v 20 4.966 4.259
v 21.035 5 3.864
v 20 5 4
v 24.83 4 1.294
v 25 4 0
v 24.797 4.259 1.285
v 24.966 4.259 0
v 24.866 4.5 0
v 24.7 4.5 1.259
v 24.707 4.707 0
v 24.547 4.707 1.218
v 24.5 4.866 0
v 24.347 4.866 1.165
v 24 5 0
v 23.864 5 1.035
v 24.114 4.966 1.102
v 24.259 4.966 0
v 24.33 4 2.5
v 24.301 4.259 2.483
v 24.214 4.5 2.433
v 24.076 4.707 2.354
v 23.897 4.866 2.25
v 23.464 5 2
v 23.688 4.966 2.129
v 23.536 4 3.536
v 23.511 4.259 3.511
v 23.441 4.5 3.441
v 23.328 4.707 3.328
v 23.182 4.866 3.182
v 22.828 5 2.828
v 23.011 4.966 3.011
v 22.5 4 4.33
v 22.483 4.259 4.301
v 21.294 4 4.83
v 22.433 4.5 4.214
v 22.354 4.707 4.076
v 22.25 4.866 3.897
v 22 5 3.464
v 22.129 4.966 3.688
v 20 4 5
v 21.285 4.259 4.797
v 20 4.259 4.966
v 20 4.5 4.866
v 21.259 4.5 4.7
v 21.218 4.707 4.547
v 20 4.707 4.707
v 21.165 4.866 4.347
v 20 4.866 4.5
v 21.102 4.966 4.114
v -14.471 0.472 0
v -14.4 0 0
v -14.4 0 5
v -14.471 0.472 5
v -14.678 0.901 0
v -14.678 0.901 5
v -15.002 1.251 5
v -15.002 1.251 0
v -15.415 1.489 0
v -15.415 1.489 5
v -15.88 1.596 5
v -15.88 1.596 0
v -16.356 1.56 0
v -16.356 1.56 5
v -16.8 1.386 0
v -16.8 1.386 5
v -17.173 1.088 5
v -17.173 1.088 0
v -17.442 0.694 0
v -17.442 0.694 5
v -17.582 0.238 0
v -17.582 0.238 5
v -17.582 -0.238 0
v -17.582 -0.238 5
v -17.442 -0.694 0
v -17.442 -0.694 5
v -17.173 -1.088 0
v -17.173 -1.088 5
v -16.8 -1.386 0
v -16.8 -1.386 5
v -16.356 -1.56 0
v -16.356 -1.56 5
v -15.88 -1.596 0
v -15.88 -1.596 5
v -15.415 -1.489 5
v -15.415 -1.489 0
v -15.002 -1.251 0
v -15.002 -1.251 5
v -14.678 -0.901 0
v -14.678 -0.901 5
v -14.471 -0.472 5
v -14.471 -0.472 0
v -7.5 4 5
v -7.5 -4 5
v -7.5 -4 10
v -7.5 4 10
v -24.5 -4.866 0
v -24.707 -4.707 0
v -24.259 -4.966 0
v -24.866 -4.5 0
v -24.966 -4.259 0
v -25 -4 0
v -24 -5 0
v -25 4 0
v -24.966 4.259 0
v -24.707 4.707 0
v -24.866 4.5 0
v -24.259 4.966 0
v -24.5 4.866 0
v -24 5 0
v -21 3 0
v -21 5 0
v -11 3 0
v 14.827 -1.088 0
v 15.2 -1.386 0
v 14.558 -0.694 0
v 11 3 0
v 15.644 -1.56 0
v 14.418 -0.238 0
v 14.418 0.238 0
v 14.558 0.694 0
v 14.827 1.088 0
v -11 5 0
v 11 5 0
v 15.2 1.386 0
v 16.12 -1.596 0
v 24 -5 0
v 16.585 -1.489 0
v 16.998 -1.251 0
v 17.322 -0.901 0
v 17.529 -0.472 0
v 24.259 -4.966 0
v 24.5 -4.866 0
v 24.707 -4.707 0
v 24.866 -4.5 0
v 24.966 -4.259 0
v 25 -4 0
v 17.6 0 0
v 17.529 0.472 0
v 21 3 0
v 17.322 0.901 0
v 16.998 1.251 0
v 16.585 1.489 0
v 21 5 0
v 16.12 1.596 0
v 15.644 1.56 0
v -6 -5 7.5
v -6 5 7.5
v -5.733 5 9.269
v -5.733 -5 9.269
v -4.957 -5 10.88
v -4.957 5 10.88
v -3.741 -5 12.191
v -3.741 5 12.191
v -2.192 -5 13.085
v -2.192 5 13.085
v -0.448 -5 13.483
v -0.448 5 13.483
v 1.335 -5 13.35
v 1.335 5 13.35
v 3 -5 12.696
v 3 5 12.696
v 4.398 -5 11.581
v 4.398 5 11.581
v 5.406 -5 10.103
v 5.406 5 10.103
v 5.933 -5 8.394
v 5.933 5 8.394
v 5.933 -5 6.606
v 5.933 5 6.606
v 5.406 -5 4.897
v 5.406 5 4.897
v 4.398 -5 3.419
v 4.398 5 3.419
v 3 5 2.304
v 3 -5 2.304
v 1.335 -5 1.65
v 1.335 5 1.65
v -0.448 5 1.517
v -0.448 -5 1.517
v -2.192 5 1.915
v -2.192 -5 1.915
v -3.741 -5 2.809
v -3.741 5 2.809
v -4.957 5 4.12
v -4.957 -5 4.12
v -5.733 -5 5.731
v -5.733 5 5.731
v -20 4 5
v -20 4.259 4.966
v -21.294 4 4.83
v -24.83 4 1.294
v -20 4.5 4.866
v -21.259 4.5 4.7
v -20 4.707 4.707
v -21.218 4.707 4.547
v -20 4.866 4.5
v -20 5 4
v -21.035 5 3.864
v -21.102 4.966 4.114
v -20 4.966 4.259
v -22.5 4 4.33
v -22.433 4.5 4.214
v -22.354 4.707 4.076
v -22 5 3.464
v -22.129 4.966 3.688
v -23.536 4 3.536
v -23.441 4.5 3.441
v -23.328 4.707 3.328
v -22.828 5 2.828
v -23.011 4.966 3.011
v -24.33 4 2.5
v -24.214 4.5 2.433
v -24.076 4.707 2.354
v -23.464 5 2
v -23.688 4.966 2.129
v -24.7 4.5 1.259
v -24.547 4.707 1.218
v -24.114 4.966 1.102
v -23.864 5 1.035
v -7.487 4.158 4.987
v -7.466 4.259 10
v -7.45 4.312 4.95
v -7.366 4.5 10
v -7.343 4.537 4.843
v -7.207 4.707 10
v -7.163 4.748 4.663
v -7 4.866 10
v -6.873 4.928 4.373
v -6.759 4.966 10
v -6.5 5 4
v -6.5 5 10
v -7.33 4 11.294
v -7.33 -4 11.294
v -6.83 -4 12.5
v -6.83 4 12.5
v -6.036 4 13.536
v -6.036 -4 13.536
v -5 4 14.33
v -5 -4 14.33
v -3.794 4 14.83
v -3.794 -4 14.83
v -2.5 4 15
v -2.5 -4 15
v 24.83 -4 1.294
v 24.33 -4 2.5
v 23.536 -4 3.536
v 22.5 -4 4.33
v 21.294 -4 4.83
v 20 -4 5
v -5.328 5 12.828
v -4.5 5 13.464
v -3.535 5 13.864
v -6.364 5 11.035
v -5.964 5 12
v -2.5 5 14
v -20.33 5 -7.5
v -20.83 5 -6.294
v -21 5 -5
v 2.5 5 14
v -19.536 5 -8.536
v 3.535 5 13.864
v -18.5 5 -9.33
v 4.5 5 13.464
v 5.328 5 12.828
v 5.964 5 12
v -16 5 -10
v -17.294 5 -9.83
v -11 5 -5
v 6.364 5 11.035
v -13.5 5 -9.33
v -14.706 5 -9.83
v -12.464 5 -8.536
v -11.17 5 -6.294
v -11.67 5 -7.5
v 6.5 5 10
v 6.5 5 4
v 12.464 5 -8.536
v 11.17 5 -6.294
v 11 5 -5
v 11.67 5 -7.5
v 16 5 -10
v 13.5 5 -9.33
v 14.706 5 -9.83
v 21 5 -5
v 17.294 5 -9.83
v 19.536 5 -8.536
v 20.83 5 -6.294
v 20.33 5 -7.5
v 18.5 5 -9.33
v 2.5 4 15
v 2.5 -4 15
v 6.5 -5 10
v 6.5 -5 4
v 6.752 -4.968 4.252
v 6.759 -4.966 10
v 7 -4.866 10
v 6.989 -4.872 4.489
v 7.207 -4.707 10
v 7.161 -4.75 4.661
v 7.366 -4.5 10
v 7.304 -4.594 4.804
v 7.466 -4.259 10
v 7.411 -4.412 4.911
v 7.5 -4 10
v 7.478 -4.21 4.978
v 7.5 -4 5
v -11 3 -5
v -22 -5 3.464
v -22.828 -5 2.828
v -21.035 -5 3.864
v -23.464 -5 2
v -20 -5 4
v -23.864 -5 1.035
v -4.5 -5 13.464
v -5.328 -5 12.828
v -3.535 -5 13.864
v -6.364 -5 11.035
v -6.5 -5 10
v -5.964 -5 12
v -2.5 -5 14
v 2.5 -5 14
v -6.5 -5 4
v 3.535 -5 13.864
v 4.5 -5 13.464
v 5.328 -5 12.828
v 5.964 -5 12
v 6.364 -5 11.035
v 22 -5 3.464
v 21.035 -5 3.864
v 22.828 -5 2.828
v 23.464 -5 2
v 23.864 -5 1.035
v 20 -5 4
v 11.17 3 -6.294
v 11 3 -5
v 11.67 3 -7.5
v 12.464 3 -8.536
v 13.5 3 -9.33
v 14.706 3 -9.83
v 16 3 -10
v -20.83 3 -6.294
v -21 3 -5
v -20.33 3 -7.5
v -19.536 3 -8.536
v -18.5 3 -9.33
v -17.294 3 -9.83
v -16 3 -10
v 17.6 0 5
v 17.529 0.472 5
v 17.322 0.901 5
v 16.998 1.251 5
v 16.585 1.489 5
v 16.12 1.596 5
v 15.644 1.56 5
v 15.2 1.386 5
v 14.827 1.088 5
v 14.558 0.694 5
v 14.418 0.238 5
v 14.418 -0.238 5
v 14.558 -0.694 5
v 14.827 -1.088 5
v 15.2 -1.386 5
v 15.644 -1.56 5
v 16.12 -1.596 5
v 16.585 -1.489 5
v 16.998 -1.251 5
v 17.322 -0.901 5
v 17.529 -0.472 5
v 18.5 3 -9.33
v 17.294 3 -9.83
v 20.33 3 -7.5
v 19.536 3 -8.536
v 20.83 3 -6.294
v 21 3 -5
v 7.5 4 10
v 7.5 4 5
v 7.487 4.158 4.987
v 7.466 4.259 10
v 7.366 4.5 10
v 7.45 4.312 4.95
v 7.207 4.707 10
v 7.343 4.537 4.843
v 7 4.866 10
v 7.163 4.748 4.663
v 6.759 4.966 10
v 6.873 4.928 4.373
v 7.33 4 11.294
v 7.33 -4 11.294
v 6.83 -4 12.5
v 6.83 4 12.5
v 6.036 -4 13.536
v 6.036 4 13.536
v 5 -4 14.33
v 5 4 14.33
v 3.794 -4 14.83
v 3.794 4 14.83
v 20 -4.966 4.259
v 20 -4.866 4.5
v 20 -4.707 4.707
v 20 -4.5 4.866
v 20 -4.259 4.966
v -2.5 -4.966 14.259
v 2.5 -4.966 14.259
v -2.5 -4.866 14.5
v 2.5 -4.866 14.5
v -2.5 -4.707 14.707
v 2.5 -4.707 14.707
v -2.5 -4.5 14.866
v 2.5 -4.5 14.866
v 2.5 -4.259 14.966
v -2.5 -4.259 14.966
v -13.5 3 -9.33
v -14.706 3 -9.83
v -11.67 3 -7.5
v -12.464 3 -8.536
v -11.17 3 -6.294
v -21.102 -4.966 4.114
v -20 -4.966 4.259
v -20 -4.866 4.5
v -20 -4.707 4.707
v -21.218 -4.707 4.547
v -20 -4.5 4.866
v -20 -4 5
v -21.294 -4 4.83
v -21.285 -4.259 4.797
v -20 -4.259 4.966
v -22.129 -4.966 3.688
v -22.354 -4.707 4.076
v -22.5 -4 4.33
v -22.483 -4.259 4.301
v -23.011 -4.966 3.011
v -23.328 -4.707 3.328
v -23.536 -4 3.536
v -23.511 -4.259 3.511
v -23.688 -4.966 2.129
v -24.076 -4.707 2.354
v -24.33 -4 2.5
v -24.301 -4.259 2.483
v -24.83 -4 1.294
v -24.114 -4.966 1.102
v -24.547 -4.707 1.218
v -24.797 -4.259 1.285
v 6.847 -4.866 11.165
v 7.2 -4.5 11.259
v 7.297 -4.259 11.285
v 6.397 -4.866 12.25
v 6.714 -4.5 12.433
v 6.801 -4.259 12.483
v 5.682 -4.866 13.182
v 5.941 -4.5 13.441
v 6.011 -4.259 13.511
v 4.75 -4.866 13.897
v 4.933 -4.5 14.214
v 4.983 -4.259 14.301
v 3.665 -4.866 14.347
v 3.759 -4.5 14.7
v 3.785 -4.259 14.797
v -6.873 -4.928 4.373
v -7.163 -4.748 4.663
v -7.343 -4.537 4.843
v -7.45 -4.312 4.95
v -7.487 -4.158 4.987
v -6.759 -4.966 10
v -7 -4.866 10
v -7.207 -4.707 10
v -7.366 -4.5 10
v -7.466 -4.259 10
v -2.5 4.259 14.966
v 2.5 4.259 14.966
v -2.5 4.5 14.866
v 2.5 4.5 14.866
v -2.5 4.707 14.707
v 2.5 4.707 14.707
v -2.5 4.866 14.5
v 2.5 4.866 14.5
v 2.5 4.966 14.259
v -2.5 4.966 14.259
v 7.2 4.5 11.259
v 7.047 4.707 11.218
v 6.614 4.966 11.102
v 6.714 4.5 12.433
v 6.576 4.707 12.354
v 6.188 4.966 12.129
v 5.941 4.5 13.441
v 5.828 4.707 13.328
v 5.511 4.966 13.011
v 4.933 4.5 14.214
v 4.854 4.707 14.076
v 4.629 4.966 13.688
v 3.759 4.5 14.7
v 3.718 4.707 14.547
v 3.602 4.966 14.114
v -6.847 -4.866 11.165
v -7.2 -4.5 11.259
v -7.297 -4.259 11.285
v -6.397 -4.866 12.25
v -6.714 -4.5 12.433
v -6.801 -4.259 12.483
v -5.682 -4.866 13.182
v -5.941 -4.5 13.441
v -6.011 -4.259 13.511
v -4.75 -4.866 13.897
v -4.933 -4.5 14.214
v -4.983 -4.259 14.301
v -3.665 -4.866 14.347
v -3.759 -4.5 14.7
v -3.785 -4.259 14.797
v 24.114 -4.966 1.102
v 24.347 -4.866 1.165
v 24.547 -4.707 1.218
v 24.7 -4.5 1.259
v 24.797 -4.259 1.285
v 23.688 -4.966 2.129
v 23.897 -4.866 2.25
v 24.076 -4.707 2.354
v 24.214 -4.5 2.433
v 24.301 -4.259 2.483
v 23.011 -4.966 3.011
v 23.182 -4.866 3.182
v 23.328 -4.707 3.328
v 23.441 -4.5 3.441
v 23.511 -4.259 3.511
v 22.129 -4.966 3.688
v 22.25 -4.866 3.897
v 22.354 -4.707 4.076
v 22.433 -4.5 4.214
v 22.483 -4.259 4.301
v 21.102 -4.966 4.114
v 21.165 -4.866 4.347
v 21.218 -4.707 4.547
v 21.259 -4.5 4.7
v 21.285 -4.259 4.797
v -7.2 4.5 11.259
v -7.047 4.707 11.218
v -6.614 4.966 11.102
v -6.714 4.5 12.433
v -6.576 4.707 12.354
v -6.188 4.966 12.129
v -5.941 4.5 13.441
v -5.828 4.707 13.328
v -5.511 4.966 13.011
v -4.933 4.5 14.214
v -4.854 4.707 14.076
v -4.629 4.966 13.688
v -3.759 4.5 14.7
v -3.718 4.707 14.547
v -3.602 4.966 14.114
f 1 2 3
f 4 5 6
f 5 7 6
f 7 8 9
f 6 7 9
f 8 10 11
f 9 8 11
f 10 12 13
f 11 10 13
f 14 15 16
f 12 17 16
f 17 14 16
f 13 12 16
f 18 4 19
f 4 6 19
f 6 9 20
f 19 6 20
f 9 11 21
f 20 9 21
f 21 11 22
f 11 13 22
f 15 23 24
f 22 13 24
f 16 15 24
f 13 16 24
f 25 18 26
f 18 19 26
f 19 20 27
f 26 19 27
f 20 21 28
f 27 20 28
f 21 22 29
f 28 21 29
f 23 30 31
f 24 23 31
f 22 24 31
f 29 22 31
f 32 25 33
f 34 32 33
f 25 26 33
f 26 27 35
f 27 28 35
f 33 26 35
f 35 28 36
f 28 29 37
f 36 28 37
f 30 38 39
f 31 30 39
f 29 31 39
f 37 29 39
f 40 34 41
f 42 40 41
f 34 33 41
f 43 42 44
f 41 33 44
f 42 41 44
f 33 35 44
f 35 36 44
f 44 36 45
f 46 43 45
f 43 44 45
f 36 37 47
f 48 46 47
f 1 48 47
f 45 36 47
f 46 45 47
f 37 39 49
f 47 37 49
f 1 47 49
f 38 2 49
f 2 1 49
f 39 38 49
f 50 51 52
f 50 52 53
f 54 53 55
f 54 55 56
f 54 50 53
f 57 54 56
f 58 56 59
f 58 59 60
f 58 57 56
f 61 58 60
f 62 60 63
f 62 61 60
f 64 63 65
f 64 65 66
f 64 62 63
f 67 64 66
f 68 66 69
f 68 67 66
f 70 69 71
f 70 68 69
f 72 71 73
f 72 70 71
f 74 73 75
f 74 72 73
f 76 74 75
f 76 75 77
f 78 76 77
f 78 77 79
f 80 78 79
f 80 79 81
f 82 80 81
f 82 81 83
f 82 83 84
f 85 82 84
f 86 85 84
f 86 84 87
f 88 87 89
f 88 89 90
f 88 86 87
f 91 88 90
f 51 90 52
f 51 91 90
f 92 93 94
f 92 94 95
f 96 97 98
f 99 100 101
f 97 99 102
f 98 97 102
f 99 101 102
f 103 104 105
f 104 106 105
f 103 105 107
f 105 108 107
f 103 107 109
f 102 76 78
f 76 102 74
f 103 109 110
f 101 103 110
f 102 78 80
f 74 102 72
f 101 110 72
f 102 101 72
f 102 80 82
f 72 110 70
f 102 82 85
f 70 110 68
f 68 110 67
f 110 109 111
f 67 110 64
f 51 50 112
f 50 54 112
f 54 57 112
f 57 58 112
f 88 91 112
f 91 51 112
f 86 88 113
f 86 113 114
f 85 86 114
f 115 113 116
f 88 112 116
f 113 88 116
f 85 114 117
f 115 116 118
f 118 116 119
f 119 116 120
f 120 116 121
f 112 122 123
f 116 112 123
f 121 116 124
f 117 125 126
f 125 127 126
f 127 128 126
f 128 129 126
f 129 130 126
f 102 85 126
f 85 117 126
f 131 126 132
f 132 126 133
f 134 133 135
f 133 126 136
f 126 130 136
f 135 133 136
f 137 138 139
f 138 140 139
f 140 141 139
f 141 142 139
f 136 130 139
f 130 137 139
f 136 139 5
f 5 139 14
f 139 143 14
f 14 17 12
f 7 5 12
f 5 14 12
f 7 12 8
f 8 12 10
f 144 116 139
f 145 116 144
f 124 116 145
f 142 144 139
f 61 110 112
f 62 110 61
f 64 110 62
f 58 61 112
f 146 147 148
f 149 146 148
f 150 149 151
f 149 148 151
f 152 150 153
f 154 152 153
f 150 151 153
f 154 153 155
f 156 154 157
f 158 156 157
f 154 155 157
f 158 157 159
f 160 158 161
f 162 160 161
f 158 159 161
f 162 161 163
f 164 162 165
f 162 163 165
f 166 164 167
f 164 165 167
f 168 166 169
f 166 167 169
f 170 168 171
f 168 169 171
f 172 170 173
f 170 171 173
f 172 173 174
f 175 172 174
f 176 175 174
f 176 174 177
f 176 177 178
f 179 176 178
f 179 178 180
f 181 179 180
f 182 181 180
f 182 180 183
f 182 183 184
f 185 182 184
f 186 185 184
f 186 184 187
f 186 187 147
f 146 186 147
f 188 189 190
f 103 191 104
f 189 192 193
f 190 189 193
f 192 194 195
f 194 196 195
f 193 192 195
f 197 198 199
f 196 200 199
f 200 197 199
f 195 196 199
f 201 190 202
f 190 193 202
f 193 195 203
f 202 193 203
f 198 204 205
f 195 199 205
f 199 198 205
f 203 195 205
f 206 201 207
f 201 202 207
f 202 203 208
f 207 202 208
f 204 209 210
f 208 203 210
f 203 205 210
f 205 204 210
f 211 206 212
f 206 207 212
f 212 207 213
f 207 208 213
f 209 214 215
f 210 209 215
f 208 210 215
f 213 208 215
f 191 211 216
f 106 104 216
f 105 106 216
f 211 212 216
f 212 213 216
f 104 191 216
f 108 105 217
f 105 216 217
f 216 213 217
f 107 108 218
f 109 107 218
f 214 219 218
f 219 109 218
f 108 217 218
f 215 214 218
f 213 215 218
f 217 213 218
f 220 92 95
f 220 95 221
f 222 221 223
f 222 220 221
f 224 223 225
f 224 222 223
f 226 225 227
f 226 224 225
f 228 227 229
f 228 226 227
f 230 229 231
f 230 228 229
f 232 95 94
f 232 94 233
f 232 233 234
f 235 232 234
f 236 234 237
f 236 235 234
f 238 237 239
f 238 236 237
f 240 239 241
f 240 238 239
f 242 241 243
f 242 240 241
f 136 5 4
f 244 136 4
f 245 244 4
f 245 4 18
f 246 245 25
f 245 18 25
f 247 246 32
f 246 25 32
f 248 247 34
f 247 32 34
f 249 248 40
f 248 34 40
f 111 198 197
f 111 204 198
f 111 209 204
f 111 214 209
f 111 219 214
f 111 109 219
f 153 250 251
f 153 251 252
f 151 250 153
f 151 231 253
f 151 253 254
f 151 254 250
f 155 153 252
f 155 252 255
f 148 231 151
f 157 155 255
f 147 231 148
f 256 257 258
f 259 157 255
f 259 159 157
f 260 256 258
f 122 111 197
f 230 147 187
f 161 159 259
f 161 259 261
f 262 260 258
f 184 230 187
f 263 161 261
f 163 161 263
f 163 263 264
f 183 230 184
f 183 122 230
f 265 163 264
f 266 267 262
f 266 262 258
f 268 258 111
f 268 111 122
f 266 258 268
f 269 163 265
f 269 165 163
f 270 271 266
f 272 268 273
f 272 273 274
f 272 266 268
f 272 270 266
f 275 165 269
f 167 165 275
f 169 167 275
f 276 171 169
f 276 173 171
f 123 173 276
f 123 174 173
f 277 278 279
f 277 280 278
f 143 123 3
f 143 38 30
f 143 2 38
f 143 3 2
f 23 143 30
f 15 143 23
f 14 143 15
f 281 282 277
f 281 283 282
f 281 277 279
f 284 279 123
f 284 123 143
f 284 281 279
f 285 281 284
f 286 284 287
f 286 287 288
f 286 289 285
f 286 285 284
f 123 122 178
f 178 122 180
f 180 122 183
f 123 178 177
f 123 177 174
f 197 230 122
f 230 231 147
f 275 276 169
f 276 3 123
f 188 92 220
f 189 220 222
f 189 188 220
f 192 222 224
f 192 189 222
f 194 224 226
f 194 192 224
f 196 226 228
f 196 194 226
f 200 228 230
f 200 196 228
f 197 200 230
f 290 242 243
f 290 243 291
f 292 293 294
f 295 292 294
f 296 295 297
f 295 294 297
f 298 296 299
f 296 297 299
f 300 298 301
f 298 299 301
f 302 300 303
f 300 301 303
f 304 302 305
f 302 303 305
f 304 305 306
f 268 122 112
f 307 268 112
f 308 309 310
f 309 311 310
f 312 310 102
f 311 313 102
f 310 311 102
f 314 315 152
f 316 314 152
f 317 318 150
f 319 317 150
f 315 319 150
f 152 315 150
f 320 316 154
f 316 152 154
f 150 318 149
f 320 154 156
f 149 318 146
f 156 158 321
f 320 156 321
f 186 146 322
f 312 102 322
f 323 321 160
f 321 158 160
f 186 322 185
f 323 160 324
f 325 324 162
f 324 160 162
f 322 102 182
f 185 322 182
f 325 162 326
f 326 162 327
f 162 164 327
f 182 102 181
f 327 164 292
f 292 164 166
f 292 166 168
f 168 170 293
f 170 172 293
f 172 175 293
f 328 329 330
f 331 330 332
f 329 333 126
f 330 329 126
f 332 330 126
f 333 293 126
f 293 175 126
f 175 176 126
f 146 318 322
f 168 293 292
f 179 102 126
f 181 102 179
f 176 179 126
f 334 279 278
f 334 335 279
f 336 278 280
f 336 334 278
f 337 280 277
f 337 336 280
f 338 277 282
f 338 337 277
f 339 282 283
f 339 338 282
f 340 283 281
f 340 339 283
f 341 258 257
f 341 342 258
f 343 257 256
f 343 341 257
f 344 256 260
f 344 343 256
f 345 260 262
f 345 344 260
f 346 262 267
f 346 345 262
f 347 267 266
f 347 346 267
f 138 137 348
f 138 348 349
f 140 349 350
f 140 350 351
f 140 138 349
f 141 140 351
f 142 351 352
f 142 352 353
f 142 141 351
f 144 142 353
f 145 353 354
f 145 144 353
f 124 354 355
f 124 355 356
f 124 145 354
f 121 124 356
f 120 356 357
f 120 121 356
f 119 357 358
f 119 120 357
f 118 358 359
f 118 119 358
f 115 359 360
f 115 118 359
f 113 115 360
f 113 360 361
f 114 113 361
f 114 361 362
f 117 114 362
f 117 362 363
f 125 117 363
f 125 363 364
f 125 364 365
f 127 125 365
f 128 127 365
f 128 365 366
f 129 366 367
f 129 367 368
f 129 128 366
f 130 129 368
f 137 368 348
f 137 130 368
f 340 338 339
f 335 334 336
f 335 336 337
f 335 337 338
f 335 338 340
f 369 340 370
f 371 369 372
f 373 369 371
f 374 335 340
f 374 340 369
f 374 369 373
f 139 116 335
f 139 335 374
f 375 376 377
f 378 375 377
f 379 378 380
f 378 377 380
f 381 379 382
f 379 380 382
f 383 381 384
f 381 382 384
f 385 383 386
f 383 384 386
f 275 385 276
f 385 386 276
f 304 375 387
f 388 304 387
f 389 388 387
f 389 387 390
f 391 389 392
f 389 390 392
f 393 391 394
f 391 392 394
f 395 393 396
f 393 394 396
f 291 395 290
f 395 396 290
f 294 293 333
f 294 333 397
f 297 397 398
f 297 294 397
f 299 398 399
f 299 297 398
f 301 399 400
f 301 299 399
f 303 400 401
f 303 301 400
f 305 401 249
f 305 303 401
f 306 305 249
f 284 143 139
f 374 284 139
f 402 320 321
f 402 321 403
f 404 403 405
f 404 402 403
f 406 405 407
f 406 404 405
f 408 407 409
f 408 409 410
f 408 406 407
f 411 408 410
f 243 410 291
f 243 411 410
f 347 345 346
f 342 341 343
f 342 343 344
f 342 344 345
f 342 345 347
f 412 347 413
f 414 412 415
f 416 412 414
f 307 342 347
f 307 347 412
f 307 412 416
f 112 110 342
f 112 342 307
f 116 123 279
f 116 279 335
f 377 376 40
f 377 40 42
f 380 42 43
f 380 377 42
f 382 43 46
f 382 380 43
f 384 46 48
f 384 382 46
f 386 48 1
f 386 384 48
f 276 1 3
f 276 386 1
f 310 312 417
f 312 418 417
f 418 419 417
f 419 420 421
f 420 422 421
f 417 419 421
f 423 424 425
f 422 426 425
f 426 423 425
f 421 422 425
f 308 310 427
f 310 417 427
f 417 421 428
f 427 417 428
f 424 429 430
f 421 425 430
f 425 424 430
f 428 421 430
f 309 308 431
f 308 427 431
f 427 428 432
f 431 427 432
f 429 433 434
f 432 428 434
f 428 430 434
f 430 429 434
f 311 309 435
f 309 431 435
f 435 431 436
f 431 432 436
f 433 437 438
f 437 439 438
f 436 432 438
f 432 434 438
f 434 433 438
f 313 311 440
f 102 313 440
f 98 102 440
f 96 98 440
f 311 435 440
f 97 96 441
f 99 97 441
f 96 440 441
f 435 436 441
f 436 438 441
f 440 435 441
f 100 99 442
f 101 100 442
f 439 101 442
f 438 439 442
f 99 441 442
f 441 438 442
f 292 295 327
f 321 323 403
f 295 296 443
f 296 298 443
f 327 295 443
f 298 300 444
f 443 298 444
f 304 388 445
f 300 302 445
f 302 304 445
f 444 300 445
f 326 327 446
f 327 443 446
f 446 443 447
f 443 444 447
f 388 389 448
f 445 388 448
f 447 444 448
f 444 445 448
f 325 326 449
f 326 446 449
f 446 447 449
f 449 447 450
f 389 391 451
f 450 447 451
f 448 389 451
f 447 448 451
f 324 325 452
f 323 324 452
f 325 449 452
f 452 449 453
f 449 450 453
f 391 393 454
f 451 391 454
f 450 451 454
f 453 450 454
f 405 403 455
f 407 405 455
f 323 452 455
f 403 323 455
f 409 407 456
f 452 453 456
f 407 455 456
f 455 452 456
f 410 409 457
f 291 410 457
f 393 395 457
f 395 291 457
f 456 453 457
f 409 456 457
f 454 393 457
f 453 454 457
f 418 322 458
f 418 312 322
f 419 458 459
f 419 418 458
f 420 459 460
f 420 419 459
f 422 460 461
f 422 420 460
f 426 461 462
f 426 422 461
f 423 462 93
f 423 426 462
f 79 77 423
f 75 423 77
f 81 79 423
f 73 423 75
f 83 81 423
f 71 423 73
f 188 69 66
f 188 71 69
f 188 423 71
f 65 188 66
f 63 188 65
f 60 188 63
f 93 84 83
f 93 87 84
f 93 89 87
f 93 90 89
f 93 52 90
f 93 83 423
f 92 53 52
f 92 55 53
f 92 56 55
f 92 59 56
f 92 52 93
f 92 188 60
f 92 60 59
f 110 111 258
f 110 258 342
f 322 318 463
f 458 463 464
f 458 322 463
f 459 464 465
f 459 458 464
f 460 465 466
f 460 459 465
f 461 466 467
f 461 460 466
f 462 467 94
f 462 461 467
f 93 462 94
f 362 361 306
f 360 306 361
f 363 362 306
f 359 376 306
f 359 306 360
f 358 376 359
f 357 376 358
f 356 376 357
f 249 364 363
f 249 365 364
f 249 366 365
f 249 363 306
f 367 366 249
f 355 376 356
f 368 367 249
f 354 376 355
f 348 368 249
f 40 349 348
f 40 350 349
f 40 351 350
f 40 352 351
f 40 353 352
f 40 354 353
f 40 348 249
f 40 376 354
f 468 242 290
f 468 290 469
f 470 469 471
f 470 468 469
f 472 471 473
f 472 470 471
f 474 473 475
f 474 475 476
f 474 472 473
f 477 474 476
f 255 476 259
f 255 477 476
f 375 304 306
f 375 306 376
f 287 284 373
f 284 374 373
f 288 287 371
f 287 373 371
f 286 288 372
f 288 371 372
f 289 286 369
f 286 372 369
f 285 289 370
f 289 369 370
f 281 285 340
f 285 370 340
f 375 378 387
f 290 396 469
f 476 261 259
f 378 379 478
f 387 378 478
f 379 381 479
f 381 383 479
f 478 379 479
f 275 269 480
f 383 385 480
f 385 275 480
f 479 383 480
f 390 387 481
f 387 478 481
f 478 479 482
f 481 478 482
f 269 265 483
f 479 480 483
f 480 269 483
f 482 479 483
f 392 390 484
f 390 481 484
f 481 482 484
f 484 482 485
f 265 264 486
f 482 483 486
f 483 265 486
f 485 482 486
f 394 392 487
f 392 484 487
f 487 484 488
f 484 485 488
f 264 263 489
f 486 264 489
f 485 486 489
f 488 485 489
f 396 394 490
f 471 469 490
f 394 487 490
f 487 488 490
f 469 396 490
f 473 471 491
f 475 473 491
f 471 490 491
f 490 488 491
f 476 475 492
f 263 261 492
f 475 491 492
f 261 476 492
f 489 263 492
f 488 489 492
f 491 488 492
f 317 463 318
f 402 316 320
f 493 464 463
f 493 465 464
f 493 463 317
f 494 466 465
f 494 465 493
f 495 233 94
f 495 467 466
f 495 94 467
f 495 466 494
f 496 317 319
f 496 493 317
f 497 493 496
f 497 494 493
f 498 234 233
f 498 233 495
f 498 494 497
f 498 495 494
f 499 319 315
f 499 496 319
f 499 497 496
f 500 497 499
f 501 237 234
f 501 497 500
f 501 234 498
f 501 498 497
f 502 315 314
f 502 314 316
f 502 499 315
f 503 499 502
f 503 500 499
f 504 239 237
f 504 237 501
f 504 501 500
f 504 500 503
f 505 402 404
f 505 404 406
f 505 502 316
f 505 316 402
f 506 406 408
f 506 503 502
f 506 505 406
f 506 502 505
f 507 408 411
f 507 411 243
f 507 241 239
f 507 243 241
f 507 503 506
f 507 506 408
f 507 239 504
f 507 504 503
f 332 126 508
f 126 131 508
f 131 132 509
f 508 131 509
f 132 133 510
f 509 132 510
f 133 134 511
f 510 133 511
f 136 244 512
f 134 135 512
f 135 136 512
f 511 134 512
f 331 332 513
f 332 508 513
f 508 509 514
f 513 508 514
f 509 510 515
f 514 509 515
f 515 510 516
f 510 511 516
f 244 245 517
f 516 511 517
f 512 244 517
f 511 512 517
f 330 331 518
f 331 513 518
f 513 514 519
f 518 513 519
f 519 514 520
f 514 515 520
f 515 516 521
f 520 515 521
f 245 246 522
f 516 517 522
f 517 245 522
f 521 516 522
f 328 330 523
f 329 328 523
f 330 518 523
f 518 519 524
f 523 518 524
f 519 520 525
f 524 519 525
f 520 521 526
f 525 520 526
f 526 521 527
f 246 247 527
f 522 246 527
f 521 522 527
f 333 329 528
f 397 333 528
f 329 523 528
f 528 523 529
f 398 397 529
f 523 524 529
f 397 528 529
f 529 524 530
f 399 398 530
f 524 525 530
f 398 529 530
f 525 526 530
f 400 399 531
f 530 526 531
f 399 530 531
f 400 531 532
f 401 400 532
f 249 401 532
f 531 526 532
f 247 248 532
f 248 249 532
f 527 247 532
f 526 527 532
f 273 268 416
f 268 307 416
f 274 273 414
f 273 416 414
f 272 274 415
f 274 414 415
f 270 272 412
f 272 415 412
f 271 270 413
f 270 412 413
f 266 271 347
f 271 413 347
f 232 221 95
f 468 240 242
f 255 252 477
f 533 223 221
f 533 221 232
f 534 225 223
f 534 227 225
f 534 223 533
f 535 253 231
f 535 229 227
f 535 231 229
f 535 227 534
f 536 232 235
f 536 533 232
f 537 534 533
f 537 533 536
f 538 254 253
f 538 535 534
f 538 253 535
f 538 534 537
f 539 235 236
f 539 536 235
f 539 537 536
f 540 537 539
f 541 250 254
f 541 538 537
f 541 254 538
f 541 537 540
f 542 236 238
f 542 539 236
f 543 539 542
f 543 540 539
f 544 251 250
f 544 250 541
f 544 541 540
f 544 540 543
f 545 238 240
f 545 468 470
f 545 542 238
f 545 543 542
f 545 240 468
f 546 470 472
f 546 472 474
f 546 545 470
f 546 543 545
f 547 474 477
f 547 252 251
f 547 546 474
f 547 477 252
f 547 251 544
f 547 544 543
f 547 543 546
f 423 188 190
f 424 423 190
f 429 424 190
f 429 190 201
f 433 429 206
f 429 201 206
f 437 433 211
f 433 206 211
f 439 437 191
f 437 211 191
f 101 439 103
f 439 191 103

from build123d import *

# Parameters (mm, degrees)
F0_W         = 50
F0_H         = 10
F0_R         = 1.6
F1_DEPTH     = 5
F2_W         = 15
F2_H         = 10
F2_R         = 1.6
F3_DEPTH     = 10
F5_R         = 5
F6_R         = 4.99999
F4_R         = 6
F7_DEPTH     = 25
F8_T1_DEPTH  = 12.50001
F8_T3_DEPTH  = 5
F8_T5_DEPTH  = 5
F8_T7_DEPTH  = 12.50001
F8_T9_DEPTH  = 2.50001
F8_T12_ANGLE = 90
F8_T14_ANGLE = 90
F8_T16_ANGLE = 90
F8_T18_ANGLE = 90
F8_T20_ANGLE = 90
F8_T22_ANGLE = 90
F8_T24_ANGLE = 90
F8_T26_ANGLE = 90
F8_T31_DEPTH = 7.5
F8_T35_DEPTH = 15.00001
F8_T42_DEPTH = 15.00001
F8_T46_DEPTH = 7.5
F8_T53_DEPTH = 15.00001
F8_T57_DEPTH = 7.5
F8_T64_DEPTH = 7.5
F8_T68_DEPTH = 15.00001
F9_W         = 10
F9_H         = 2
F10_DEPTH    = 10
F11_R        = 4.99999


# Not quite as in the source:
# - a fillet or chamfer that OpenCascade refuses, or shapes differently, is made with other operations: its cross-section is extruded or revolved along the edge and cut away or added
# - a fillet or chamfer is up to 0.001 mm smaller than in the source, because OpenCascade refuses the exact size


with BuildPart() as f1:
    # F0 (on Top) → F1 (new body)
    with BuildSketch(Plane.XY):
        Rectangle(F0_W, F0_H)
        with Locations((-16, 0)):
            Circle(F0_R, mode=Mode.SUBTRACT)
        with Locations((16, 0)):
            Circle(F0_R, mode=Mode.SUBTRACT)
    extrude(amount=F1_DEPTH)

    # F2 (on face) → F3 (join)
    with BuildSketch(Plane.XY.offset(5)):
        Rectangle(F2_W, F2_H)
        with Locations((-3.9, 0)):
            Circle(F2_R, mode=Mode.SUBTRACT)
        with Locations((3.9, 0)):
            Circle(F2_R, mode=Mode.SUBTRACT)
        with Locations((3.9, 0)):
            Circle(F2_R)
        with Locations((-3.9, 0)):
            Circle(F2_R)
    extrude(amount=F3_DEPTH)

    # F5
    f5_edges = [f1.edges().sort_by_distance(p)[0] for p in [
        (7.5, 0, 15),
        (-7.5, 0, 15),
    ]]
    fillet(f5_edges, radius=F5_R)

    # F6 (radius 5 in the source; OpenCascade refuses exactly that, so slightly less here)
    f6_edges = [f1.edges().sort_by_distance(p)[0] for p in [
        (-25, 0, 5),
        (25, 0, 5),
    ]]
    fillet(f6_edges, radius=F6_R)

    # F4 (on face) → F7 (cut)
    with BuildSketch(Plane(origin=(0, 5, 0), x_dir=(-1, 0, 0), z_dir=(0, 1, 0))):
        with Locations((0, 7.5)):
            Circle(F4_R)
    extrude(amount=-F7_DEPTH, mode=Mode.SUBTRACT)

    # F8: fillet of radius 1 on 18 edges, made by hand

    # F8_s2 → F8_t1 (cut)
    with BuildSketch(Plane.YZ.offset(7.5)):
        with BuildLine():
            ThreePointArc((-5, 4), (-4.7071067812, 4.7071067812), (-4, 5))
            Line((-4, 5), (-5, 5))
            Line((-5, 5), (-5, 4))
        make_face()
        with BuildLine():
            ThreePointArc((4, 5), (4.7071067812, 4.7071067812), (5, 4))
            Line((5, 4), (5, 5))
            Line((5, 5), (4, 5))
        make_face()
    extrude(amount=F8_T1_DEPTH, mode=Mode.SUBTRACT)

    # F8_s4 → F8_t3 (cut)
    with BuildSketch(Plane.XY.offset(5)):
        with BuildLine():
            ThreePointArc((6.5, -5), (7.2071067812, -4.7071067812), (7.5, -4))
            Line((7.5, -4), (7.5, -5))
            Line((7.5, -5), (6.5, -5))
        make_face()
        with BuildLine():
            ThreePointArc((-6.5, -5), (-7.2071067812, -4.7071067812), (-7.5, -4))
            Line((-7.5, -4), (-7.5, -5))
            Line((-7.5, -5), (-6.5, -5))
        make_face()
        with BuildLine():
            ThreePointArc((7.5, 4), (7.2071067812, 4.7071067812), (6.5, 5))
            Line((6.5, 5), (7.5, 5))
            Line((7.5, 5), (7.5, 4))
        make_face()
        with BuildLine():
            ThreePointArc((-7.5, 4), (-7.2071067812, 4.7071067812), (-6.5, 5))
            Line((-6.5, 5), (-7.5, 5))
            Line((-7.5, 5), (-7.5, 4))
        make_face()
    extrude(amount=F8_T3_DEPTH, mode=Mode.SUBTRACT)

    # F8_s6 → F8_t5 (cut)
    with BuildSketch(Plane.YZ.offset(-2.5)):
        with BuildLine():
            ThreePointArc((-5, 14), (-4.7071067812, 14.7071067812), (-4, 15))
            Line((-4, 15), (-5, 15))
            Line((-5, 15), (-5, 14))
        make_face()
        with BuildLine():
            ThreePointArc((4, 15), (4.7071067812, 14.7071067812), (5, 14))
            Line((5, 14), (5, 15))
            Line((5, 15), (4, 15))
        make_face()
    extrude(amount=F8_T5_DEPTH, mode=Mode.SUBTRACT)

    # F8_s8 → F8_t7 (cut)
    with BuildSketch(Plane.YZ.offset(-20.00001)):
        with BuildLine():
            ThreePointArc((-5, 4), (-4.7071067812, 4.7071067812), (-4, 5))
            Line((-4, 5), (-5, 5))
            Line((-5, 5), (-5, 4))
        make_face()
        with BuildLine():
            ThreePointArc((4, 5), (4.7071067812, 4.7071067812), (5, 4))
            Line((5, 4), (5, 5))
            Line((5, 5), (4, 5))
        make_face()
    extrude(amount=F8_T7_DEPTH, mode=Mode.SUBTRACT)

    # F8_s10 → F8_t9 (cut)
    with BuildSketch(Plane.XY.offset(-2.5)):
        with BuildLine():
            ThreePointArc((-25, 4), (-24.7071067812, 4.7071067812), (-24, 5))
            Line((-24, 5), (-25, 5))
            Line((-25, 5), (-25, 4))
        make_face()
        with BuildLine():
            ThreePointArc((25, 4), (24.7071067812, 4.7071067812), (24, 5))
            Line((24, 5), (25, 5))
            Line((25, 5), (25, 4))
        make_face()
        with BuildLine():
            ThreePointArc((-24, -5), (-24.7071067812, -4.7071067812), (-25, -4))
            Line((-25, -4), (-25, -5))
            Line((-25, -5), (-24, -5))
        make_face()
        with BuildLine():
            ThreePointArc((24, -5), (24.7071067812, -4.7071067812), (25, -4))
            Line((25, -4), (25, -5))
            Line((25, -5), (24, -5))
        make_face()
    extrude(amount=F8_T9_DEPTH, mode=Mode.SUBTRACT)

    # F8_s11 → F8_t12 (revolve, cut)
    with BuildSketch(Plane.XY.offset(1e-05)):
        with BuildLine():
            ThreePointArc((24, -5), (24.7071067812, -4.7071067812), (25, -4))
            Line((25, -4), (25, -5))
            Line((25, -5), (24, -5))
        make_face()
    revolve(axis=Axis((20.00001, -5, 1e-05), (0, -1, 0)), revolution_arc=F8_T12_ANGLE, mode=Mode.SUBTRACT)

    # F8_s13 → F8_t14 (revolve, cut)
    with BuildSketch(Plane.XY.offset(10)):
        with BuildLine():
            ThreePointArc((6.5, -5), (7.2071067812, -4.7071067812), (7.5, -4))
            Line((7.5, -4), (7.5, -5))
            Line((7.5, -5), (6.5, -5))
        make_face()
    revolve(axis=Axis((2.5, -5, 10), (0, -1, 0)), revolution_arc=F8_T14_ANGLE, mode=Mode.SUBTRACT)

    # F8_s15 → F8_t16 (revolve, cut)
    with BuildSketch(Plane.XY.offset(10)):
        with BuildLine():
            ThreePointArc((-6.5, -5), (-7.2071067812, -4.7071067812), (-7.5, -4))
            Line((-7.5, -4), (-7.5, -5))
            Line((-7.5, -5), (-6.5, -5))
        make_face()
    revolve(axis=Axis((-2.5, -5, 10), (0, 1, 0)), revolution_arc=F8_T16_ANGLE, mode=Mode.SUBTRACT)

    # F8_s17 → F8_t18 (revolve, cut)
    with BuildSketch(Plane.YZ.offset(-20.00001)):
        with BuildLine():
            ThreePointArc((-5, 4), (-4.7071067812, 4.7071067812), (-4, 5))
            Line((-4, 5), (-5, 5))
            Line((-5, 5), (-5, 4))
        make_face()
    revolve(axis=Axis((-20.00001, -5, 1e-05), (0, -1, 0)), revolution_arc=F8_T18_ANGLE, mode=Mode.SUBTRACT)

    # F8_s19 → F8_t20 (revolve, cut)
    with BuildSketch(Plane.XY.offset(10)):
        with BuildLine():
            ThreePointArc((7.5, 4), (7.2071067812, 4.7071067812), (6.5, 5))
            Line((6.5, 5), (7.5, 5))
            Line((7.5, 5), (7.5, 4))
        make_face()
    revolve(axis=Axis((2.5, 5, 10), (0, -1, 0)), revolution_arc=F8_T20_ANGLE, mode=Mode.SUBTRACT)

    # F8_s21 → F8_t22 (revolve, cut)
    with BuildSketch(Plane.XY.offset(1e-05)):
        with BuildLine():
            ThreePointArc((25, 4), (24.7071067812, 4.7071067812), (24, 5))
            Line((24, 5), (25, 5))
            Line((25, 5), (25, 4))
        make_face()
    revolve(axis=Axis((20.00001, 5, 1e-05), (0, -1, 0)), revolution_arc=F8_T22_ANGLE, mode=Mode.SUBTRACT)

    # F8_s23 → F8_t24 (revolve, cut)
    with BuildSketch(Plane.XY.offset(10)):
        with BuildLine():
            ThreePointArc((-7.5, 4), (-7.2071067812, 4.7071067812), (-6.5, 5))
            Line((-6.5, 5), (-7.5, 5))
            Line((-7.5, 5), (-7.5, 4))
        make_face()
    revolve(axis=Axis((-2.5, 5, 10), (0, 1, 0)), revolution_arc=F8_T24_ANGLE, mode=Mode.SUBTRACT)

    # F8_s25 → F8_t26 (revolve, cut)
    with BuildSketch(Plane.YZ.offset(-20.00001)):
        with BuildLine():
            ThreePointArc((4, 5), (4.7071067812, 4.7071067812), (5, 4))
            Line((5, 4), (5, 5))
            Line((5, 5), (4, 5))
        make_face()
    revolve(axis=Axis((-20.00001, 5, 1e-05), (0, -1, 0)), revolution_arc=F8_T26_ANGLE, mode=Mode.SUBTRACT)


with BuildPart() as f8_tool29:
    # F8_s30 → F8_t31 (new body)
    with BuildSketch(Plane.XY.offset(2.5)):
        with BuildLine():
            ThreePointArc((6.5, -5), (7.2071067812, -4.7071067812), (7.5, -4))
            Line((7.5, -4), (7.5, -5))
            Line((7.5, -5), (6.5, -5))
        make_face()
    extrude(amount=F8_T31_DEPTH)

    split(bisect_by=Plane.XY.offset(5), keep=Keep.BOTTOM)


with BuildPart() as f8_tool33:
    # F8_s34 → F8_t35 (new body)
    with BuildSketch(Plane.YZ.offset(5)):
        with BuildLine():
            ThreePointArc((-5, 4), (-4.7071067812, 4.7071067812), (-4, 5))
            Line((-4, 5), (-5, 5))
            Line((-5, 5), (-5, 4))
        make_face()
    extrude(amount=F8_T35_DEPTH)

    split(bisect_by=Plane.YZ.offset(7.5), keep=Keep.BOTTOM)


with BuildPart() as f8_tool29_1:
    add(f8_tool29.part)

    # F8_t37: intersect F8_tool33
    add(f8_tool33.part, mode=Mode.INTERSECT)


with BuildPart() as f1_1:
    add(f1.part)

    # F8_t27: cut F8_tool29
    add(f8_tool29_1.part, mode=Mode.SUBTRACT)


with BuildPart() as f8_tool40:
    # F8_s41 → F8_t42 (new body)
    with BuildSketch(Plane.YZ.offset(-20.00001)):
        with BuildLine():
            ThreePointArc((-5, 4), (-4.7071067812, 4.7071067812), (-4, 5))
            Line((-4, 5), (-5, 5))
            Line((-5, 5), (-5, 4))
        make_face()
    extrude(amount=F8_T42_DEPTH)

    split(bisect_by=Plane.YZ.offset(-7.5), keep=Keep.TOP)


with BuildPart() as f8_tool44:
    # F8_s45 → F8_t46 (new body)
    with BuildSketch(Plane.XY.offset(2.5)):
        with BuildLine():
            ThreePointArc((-6.5, -5), (-7.2071067812, -4.7071067812), (-7.5, -4))
            Line((-7.5, -4), (-7.5, -5))
            Line((-7.5, -5), (-6.5, -5))
        make_face()
    extrude(amount=F8_T46_DEPTH)

    split(bisect_by=Plane.XY.offset(5), keep=Keep.BOTTOM)


with BuildPart() as f8_tool40_1:
    add(f8_tool40.part)

    # F8_t48: intersect F8_tool44
    add(f8_tool44.part, mode=Mode.INTERSECT)


with BuildPart() as f1_2:
    add(f1_1.part)

    # F8_t38: cut F8_tool40
    add(f8_tool40_1.part, mode=Mode.SUBTRACT)


with BuildPart() as f8_tool51:
    # F8_s52 → F8_t53 (new body)
    with BuildSketch(Plane.YZ.offset(-5)):
        with BuildLine():
            ThreePointArc((4, 5), (4.7071067812, 4.7071067812), (5, 4))
            Line((5, 4), (5, 5))
            Line((5, 5), (4, 5))
        make_face()
    extrude(amount=-F8_T53_DEPTH)

    split(bisect_by=Plane.YZ.offset(-7.5), keep=Keep.TOP)


with BuildPart() as f8_tool55:
    # F8_s56 → F8_t57 (new body)
    with BuildSketch(Plane.XY.offset(2.5)):
        with BuildLine():
            ThreePointArc((-7.5, 4), (-7.2071067812, 4.7071067812), (-6.5, 5))
            Line((-6.5, 5), (-7.5, 5))
            Line((-7.5, 5), (-7.5, 4))
        make_face()
    extrude(amount=F8_T57_DEPTH)

    split(bisect_by=Plane.XY.offset(5), keep=Keep.BOTTOM)


with BuildPart() as f8_tool51_1:
    add(f8_tool51.part)

    # F8_t59: intersect F8_tool55
    add(f8_tool55.part, mode=Mode.INTERSECT)


with BuildPart() as f1_3:
    add(f1_2.part)

    # F8_t49: cut F8_tool51
    add(f8_tool51_1.part, mode=Mode.SUBTRACT)


with BuildPart() as f8_tool62:
    # F8_s63 → F8_t64 (new body)
    with BuildSketch(Plane.XY.offset(2.5)):
        with BuildLine():
            ThreePointArc((7.5, 4), (7.2071067812, 4.7071067812), (6.5, 5))
            Line((6.5, 5), (7.5, 5))
            Line((7.5, 5), (7.5, 4))
        make_face()
    extrude(amount=F8_T64_DEPTH)

    split(bisect_by=Plane.XY.offset(5), keep=Keep.BOTTOM)


with BuildPart() as f8_tool66:
    # F8_s67 → F8_t68 (new body)
    with BuildSketch(Plane.YZ.offset(20.00001)):
        with BuildLine():
            ThreePointArc((4, 5), (4.7071067812, 4.7071067812), (5, 4))
            Line((5, 4), (5, 5))
            Line((5, 5), (4, 5))
        make_face()
    extrude(amount=-F8_T68_DEPTH)

    split(bisect_by=Plane.YZ.offset(7.5), keep=Keep.BOTTOM)


with BuildPart() as f8_tool62_1:
    add(f8_tool62.part)

    # F8_t70: intersect F8_tool66
    add(f8_tool66.part, mode=Mode.INTERSECT)


with BuildPart() as f1_4:
    add(f1_3.part)

    # F8_t60: cut F8_tool62
    add(f8_tool62_1.part, mode=Mode.SUBTRACT)

    # F9 (on face) → F10 (join)
    with BuildSketch(Plane(origin=(0, 0, 0), x_dir=(1, 0, 0), z_dir=(0, 0, -1))):
        with Locations((-16, -4)):
            Rectangle(F9_W, F9_H)
        with Locations((16, -4)):
            Rectangle(F9_W, F9_H)
    extrude(amount=F10_DEPTH)

    # F11 (radius 5 in the source; OpenCascade refuses exactly that, so slightly less here)
    f11_edges = [f1_4.edges().sort_by_distance(p)[0] for p in [
        (11, 4, -10),
        (21, 4, -10),
        (-21, 4, -10),
        (-11, 4, -10),
    ]]
    fillet(f11_edges, radius=F11_R)


solid = f1_4.part
